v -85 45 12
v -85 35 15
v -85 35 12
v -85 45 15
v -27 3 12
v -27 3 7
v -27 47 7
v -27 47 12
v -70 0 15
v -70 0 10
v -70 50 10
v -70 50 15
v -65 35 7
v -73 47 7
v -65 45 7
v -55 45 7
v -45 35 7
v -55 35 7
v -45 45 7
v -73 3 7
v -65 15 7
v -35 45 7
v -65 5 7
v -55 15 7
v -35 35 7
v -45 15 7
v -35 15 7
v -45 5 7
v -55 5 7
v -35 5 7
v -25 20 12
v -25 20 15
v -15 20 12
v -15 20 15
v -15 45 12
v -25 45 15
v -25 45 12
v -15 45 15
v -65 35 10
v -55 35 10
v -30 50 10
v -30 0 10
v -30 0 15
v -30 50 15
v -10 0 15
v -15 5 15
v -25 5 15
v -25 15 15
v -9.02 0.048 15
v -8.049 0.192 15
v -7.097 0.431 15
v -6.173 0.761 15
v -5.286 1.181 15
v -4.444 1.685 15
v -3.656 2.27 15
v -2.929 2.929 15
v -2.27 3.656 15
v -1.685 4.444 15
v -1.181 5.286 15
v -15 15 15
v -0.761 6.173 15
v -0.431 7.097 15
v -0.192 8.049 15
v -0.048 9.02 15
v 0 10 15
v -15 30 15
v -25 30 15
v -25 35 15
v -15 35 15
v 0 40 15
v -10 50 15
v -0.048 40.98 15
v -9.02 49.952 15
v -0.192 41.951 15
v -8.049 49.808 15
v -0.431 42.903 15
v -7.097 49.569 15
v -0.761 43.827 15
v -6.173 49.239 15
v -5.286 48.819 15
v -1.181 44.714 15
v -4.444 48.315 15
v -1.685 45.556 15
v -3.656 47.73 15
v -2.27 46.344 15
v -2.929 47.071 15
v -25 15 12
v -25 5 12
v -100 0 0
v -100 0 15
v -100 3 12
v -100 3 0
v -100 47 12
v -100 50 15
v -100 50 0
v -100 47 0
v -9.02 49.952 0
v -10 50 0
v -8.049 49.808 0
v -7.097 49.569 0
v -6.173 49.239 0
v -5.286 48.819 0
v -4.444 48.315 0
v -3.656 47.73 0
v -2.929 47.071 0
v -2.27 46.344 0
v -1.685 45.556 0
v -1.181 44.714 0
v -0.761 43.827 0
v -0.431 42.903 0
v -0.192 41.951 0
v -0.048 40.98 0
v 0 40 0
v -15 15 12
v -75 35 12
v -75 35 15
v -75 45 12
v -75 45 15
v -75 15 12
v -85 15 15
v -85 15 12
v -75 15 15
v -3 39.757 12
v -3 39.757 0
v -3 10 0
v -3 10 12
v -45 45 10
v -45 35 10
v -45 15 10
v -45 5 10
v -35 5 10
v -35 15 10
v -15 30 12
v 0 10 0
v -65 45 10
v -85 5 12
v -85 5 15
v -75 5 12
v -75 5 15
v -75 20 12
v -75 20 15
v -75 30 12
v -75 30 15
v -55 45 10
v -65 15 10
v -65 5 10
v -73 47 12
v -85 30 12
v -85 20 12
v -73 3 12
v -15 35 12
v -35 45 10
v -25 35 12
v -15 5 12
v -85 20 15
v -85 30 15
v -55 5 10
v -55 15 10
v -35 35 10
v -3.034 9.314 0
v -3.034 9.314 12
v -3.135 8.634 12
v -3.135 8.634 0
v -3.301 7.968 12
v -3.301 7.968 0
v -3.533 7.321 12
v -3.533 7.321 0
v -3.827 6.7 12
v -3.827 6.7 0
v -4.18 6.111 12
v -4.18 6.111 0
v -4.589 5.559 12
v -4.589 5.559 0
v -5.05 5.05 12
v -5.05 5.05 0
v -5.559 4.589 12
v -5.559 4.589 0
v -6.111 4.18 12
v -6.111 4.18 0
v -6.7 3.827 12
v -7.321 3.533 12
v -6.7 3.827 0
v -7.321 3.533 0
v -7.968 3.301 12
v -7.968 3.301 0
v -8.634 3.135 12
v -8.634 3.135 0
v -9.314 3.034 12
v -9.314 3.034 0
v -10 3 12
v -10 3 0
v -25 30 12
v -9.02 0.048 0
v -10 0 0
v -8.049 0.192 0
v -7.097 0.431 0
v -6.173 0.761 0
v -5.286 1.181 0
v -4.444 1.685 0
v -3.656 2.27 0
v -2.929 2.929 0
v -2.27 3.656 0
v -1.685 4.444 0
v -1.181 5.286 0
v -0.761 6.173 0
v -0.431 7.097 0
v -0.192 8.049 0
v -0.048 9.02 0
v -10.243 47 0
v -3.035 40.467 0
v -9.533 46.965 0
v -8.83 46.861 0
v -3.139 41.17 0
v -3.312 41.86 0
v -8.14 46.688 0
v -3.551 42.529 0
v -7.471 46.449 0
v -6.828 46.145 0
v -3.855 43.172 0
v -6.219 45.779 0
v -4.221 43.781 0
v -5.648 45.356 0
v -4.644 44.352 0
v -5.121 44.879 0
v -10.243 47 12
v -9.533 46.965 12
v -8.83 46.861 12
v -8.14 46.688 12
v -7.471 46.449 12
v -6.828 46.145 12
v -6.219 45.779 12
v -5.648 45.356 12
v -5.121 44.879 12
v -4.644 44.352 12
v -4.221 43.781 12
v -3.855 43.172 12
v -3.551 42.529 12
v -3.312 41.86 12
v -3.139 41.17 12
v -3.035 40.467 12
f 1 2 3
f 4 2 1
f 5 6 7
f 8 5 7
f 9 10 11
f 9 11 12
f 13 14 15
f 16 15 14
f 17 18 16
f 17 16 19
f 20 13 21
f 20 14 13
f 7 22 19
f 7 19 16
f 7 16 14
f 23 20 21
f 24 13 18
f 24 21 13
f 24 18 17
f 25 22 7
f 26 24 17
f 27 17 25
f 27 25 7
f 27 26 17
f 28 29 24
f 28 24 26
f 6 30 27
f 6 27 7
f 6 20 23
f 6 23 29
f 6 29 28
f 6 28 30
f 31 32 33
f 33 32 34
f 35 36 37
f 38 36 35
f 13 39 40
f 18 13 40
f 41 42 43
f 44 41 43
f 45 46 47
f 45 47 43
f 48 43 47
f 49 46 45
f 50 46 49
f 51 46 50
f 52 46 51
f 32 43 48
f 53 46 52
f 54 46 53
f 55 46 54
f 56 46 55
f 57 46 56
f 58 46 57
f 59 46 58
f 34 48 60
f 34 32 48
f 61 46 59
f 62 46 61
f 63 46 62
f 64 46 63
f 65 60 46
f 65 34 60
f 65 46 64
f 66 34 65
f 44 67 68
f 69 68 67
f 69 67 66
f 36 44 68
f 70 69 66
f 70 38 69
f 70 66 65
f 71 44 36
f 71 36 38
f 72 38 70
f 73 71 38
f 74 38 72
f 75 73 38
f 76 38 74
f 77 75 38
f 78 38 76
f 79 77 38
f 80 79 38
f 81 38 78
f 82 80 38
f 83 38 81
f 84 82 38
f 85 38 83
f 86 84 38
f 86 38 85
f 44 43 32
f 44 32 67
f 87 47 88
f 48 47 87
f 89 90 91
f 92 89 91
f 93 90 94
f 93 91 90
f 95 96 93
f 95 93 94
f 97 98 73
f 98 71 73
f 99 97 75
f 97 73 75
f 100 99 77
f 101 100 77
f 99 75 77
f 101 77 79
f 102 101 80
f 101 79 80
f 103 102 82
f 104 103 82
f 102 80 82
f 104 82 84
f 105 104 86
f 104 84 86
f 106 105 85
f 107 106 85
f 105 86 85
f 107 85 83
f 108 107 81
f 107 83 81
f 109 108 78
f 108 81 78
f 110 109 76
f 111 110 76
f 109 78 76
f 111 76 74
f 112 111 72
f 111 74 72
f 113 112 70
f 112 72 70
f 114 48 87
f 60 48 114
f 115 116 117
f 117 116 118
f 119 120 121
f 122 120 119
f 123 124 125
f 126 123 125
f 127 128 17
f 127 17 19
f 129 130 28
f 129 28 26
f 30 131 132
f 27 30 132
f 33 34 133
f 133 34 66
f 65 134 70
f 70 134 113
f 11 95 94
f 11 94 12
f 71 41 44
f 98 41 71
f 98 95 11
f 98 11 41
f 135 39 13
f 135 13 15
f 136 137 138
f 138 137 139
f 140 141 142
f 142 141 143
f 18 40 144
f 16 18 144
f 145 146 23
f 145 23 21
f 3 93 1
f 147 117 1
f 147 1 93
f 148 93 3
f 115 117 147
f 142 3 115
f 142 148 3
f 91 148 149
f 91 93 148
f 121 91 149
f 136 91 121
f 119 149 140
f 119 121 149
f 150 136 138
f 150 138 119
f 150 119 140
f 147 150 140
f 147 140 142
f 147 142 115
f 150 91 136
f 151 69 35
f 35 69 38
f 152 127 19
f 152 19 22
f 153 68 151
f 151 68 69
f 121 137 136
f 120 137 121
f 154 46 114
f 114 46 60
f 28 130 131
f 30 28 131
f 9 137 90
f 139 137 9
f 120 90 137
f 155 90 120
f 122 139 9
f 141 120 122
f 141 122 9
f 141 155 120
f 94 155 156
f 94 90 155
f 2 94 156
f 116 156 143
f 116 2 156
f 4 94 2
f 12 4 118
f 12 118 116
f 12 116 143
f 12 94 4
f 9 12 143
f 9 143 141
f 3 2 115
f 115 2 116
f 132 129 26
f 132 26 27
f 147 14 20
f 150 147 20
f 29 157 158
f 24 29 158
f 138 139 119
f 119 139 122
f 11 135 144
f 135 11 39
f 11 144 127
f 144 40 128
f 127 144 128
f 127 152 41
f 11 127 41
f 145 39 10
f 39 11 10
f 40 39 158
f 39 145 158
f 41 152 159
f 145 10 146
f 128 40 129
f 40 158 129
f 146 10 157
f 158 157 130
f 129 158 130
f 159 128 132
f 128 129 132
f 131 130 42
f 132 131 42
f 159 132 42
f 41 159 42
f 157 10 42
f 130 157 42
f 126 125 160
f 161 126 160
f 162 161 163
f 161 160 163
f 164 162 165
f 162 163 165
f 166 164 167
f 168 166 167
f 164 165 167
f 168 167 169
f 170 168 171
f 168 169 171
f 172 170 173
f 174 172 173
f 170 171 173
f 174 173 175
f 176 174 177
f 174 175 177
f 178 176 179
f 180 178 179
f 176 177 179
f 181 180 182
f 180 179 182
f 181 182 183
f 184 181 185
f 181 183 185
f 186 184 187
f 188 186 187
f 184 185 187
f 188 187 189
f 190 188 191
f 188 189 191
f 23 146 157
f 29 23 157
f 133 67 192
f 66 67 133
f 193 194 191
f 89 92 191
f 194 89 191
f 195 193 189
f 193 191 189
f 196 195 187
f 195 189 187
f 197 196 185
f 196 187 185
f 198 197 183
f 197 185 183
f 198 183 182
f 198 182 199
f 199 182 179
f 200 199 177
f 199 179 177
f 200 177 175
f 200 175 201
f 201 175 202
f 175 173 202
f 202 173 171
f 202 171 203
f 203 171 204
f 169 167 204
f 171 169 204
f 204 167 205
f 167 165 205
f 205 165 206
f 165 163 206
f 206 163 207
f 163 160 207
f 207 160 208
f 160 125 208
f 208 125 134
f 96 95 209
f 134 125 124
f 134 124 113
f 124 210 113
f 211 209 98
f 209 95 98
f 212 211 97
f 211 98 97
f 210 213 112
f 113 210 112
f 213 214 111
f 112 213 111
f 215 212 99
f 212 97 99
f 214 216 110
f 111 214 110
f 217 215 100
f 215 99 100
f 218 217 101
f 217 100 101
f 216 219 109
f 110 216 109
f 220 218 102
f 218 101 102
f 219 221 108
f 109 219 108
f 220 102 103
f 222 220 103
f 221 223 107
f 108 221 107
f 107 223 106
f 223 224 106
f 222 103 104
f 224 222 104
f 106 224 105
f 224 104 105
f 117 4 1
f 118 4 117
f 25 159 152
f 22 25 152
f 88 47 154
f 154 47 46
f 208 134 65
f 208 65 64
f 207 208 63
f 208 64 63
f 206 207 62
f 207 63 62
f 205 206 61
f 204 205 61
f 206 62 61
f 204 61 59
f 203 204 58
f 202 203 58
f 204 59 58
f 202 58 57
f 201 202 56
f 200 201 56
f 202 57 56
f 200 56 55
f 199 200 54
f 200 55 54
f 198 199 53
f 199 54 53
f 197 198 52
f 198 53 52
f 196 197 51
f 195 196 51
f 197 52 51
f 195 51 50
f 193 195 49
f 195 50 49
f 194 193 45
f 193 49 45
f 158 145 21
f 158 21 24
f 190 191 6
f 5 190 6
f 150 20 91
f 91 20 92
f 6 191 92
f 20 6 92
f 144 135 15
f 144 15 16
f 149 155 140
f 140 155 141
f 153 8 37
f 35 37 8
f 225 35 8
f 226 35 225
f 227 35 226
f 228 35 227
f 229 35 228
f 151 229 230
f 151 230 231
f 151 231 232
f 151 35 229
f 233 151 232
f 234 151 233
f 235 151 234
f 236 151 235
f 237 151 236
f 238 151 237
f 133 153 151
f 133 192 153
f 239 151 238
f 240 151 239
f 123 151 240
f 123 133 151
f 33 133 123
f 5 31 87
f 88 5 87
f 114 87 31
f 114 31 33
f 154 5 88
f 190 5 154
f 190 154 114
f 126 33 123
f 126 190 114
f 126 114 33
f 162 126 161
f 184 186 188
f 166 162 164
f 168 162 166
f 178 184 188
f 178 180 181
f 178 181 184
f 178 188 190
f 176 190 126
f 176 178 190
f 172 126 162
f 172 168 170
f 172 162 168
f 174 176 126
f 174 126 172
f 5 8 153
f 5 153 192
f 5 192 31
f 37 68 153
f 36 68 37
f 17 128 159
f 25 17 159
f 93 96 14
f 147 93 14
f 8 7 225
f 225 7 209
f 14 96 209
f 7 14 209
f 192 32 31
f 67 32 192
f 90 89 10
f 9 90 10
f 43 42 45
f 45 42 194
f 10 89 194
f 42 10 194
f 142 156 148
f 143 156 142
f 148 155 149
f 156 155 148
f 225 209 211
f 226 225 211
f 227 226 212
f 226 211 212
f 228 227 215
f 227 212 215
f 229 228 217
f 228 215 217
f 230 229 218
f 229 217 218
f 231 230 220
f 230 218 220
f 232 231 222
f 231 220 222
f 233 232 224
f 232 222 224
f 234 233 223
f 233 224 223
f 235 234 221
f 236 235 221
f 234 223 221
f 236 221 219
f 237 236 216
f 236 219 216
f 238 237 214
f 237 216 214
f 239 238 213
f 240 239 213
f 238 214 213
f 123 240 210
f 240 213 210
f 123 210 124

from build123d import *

# Parameters (mm, degrees)
F0_W      = 100
F0_H      = 50
F1_DEPTH  = 15
F2_W      = 10
F2_H      = 10
F3_DEPTH  = 15
F4_R      = 10
F5_R      = 10
F6_W      = 40
F6_H      = 5
F7_DEPTH  = 50
F8_W      = 40
F8_H      = 44
F8_W_2    = 10
F8_H_2    = 10
F8_W_3    = 27
F8_W_4    = 3
F9_DEPTH  = 7
F10_DEPTH = 12


with BuildPart() as f1:
    # F0 (on Top) → F1 (new body)
    with BuildSketch(Plane.XY):
        with Locations((-50, 25)):
            Rectangle(F0_W, F0_H)
    extrude(amount=F1_DEPTH)

    # F2 (on face) → F3 (cut, through all)
    with BuildSketch(Plane.XY.offset(15)):
        with Locations((-20, 40)):
            Rectangle(F2_W, F2_H)
        with Locations((-80, 10)):
            Rectangle(F2_W, F2_H)
        with Locations((-20, 10)):
            Rectangle(F2_W, F2_H)
        with Locations((-20, 25)):
            Rectangle(F2_W, F2_H)
        with Locations((-40, 40)):
            Rectangle(F2_W, F2_H)
        with Locations((-60, 40)):
            Rectangle(F2_W, F2_H)
        with Locations((-60, 10)):
            Rectangle(F2_W, F2_H)
        with Locations((-40, 10)):
            Rectangle(F2_W, F2_H)
        with Locations((-80, 40)):
            Rectangle(F2_W, F2_H)
        with Locations((-80, 25)):
            Rectangle(F2_W, F2_H)
    extrude(amount=-F3_DEPTH, mode=Mode.SUBTRACT)

    # F4
    f4_edges = [f1.edges().sort_by_distance(p)[0] for p in [
        (0, 50, 7.5),
    ]]
    fillet(f4_edges, radius=F4_R)

    # F5
    f5_edges = [f1.edges().sort_by_distance(p)[0] for p in [
        (0, 0, 7.5),
    ]]
    fillet(f5_edges, radius=F5_R)

    # F6 (on face) → F7 (cut, through all)
    with BuildSketch(Plane.XZ):
        with Locations((-50, 12.5)):
            Rectangle(F6_W, F6_H)
    extrude(amount=-F7_DEPTH, mode=Mode.SUBTRACT)

    # F8 (on face) → F9 (cut)
    with BuildSketch(Plane(origin=(0, 0, 0), x_dir=(1, 0, 0), z_dir=(0, 0, -1))):
        with Locations((-50, -25)):
            Rectangle(F8_W, F8_H)
        with Locations((-60, -40)):
            Rectangle(F8_W_2, F8_H_2, mode=Mode.SUBTRACT)
        with Locations((-40, -40)):
            Rectangle(F8_W_2, F8_H_2, mode=Mode.SUBTRACT)
        with Locations((-60, -10)):
            Rectangle(F8_W_2, F8_H_2, mode=Mode.SUBTRACT)
        with Locations((-40, -10)):
            Rectangle(F8_W_2, F8_H_2, mode=Mode.SUBTRACT)
        with Locations((-86.5, -25)):
            Rectangle(F8_W_3, F8_H)
        with Locations((-80, -40)):
            Rectangle(F8_W_2, F8_H_2, mode=Mode.SUBTRACT)
        with Locations((-80, -25)):
            Rectangle(F8_W_2, F8_H_2, mode=Mode.SUBTRACT)
        with Locations((-80, -10)):
            Rectangle(F8_W_2, F8_H_2, mode=Mode.SUBTRACT)
        with BuildLine():
            Line((-27, -3), (-27, -47))
            Line((-27, -47), (-10.2426406871, -47))
            ThreePointArc((-10.2426406871, -47), (-5.1213203436, -44.8786796564), (-3, -39.7573593129))
            Line((-3, -39.7573593129), (-3, -10))
            ThreePointArc((-3, -10), (-5.0502525317, -5.0502525317), (-10, -3))
            Line((-10, -3), (-27, -3))
        make_face()
        with Locations((-20, -40)):
            Rectangle(F8_W_2, F8_H_2, mode=Mode.SUBTRACT)
        with Locations((-20, -25)):
            Rectangle(F8_W_2, F8_H_2, mode=Mode.SUBTRACT)
        with Locations((-20, -10)):
            Rectangle(F8_W_2, F8_H_2, mode=Mode.SUBTRACT)
        with Locations((-28.5, -25)):
            Rectangle(F8_W_4, F8_H)
        with Locations((-71.5, -25)):
            Rectangle(F8_W_4, F8_H)
        with Locations((-20, -40)):
            Rectangle(F8_W_2, F8_H_2)
        with Locations((-80, -25)):
            Rectangle(F8_W_2, F8_H_2)
        with Locations((-80, -10)):
            Rectangle(F8_W_2, F8_H_2)
        with Locations((-20, -25)):
            Rectangle(F8_W_2, F8_H_2)
    extrude(amount=-F9_DEPTH, mode=Mode.SUBTRACT)

    # F8 (on face) → F10 (cut)
    with BuildSketch(Plane(origin=(0, 0, 0), x_dir=(1, 0, 0), z_dir=(0, 0, -1))):
        with Locations((-86.5, -25)):
            Rectangle(F8_W_3, F8_H)
        with Locations((-80, -40)):
            Rectangle(F8_W_2, F8_H_2, mode=Mode.SUBTRACT)
        with Locations((-80, -25)):
            Rectangle(F8_W_2, F8_H_2, mode=Mode.SUBTRACT)
        with Locations((-80, -10)):
            Rectangle(F8_W_2, F8_H_2, mode=Mode.SUBTRACT)
        with BuildLine():
            Line((-27, -3), (-27, -47))
            Line((-27, -47), (-10.2426406871, -47))
            ThreePointArc((-10.2426406871, -47), (-5.1213203436, -44.8786796564), (-3, -39.7573593129))
            Line((-3, -39.7573593129), (-3, -10))
            ThreePointArc((-3, -10), (-5.0502525317, -5.0502525317), (-10, -3))
            Line((-10, -3), (-27, -3))
        make_face()
        with Locations((-20, -40)):
            Rectangle(F8_W_2, F8_H_2, mode=Mode.SUBTRACT)
        with Locations((-20, -25)):
            Rectangle(F8_W_2, F8_H_2, mode=Mode.SUBTRACT)
        with Locations((-20, -10)):
            Rectangle(F8_W_2, F8_H_2, mode=Mode.SUBTRACT)
    extrude(amount=-F10_DEPTH, mode=Mode.SUBTRACT)


solid = f1.part
